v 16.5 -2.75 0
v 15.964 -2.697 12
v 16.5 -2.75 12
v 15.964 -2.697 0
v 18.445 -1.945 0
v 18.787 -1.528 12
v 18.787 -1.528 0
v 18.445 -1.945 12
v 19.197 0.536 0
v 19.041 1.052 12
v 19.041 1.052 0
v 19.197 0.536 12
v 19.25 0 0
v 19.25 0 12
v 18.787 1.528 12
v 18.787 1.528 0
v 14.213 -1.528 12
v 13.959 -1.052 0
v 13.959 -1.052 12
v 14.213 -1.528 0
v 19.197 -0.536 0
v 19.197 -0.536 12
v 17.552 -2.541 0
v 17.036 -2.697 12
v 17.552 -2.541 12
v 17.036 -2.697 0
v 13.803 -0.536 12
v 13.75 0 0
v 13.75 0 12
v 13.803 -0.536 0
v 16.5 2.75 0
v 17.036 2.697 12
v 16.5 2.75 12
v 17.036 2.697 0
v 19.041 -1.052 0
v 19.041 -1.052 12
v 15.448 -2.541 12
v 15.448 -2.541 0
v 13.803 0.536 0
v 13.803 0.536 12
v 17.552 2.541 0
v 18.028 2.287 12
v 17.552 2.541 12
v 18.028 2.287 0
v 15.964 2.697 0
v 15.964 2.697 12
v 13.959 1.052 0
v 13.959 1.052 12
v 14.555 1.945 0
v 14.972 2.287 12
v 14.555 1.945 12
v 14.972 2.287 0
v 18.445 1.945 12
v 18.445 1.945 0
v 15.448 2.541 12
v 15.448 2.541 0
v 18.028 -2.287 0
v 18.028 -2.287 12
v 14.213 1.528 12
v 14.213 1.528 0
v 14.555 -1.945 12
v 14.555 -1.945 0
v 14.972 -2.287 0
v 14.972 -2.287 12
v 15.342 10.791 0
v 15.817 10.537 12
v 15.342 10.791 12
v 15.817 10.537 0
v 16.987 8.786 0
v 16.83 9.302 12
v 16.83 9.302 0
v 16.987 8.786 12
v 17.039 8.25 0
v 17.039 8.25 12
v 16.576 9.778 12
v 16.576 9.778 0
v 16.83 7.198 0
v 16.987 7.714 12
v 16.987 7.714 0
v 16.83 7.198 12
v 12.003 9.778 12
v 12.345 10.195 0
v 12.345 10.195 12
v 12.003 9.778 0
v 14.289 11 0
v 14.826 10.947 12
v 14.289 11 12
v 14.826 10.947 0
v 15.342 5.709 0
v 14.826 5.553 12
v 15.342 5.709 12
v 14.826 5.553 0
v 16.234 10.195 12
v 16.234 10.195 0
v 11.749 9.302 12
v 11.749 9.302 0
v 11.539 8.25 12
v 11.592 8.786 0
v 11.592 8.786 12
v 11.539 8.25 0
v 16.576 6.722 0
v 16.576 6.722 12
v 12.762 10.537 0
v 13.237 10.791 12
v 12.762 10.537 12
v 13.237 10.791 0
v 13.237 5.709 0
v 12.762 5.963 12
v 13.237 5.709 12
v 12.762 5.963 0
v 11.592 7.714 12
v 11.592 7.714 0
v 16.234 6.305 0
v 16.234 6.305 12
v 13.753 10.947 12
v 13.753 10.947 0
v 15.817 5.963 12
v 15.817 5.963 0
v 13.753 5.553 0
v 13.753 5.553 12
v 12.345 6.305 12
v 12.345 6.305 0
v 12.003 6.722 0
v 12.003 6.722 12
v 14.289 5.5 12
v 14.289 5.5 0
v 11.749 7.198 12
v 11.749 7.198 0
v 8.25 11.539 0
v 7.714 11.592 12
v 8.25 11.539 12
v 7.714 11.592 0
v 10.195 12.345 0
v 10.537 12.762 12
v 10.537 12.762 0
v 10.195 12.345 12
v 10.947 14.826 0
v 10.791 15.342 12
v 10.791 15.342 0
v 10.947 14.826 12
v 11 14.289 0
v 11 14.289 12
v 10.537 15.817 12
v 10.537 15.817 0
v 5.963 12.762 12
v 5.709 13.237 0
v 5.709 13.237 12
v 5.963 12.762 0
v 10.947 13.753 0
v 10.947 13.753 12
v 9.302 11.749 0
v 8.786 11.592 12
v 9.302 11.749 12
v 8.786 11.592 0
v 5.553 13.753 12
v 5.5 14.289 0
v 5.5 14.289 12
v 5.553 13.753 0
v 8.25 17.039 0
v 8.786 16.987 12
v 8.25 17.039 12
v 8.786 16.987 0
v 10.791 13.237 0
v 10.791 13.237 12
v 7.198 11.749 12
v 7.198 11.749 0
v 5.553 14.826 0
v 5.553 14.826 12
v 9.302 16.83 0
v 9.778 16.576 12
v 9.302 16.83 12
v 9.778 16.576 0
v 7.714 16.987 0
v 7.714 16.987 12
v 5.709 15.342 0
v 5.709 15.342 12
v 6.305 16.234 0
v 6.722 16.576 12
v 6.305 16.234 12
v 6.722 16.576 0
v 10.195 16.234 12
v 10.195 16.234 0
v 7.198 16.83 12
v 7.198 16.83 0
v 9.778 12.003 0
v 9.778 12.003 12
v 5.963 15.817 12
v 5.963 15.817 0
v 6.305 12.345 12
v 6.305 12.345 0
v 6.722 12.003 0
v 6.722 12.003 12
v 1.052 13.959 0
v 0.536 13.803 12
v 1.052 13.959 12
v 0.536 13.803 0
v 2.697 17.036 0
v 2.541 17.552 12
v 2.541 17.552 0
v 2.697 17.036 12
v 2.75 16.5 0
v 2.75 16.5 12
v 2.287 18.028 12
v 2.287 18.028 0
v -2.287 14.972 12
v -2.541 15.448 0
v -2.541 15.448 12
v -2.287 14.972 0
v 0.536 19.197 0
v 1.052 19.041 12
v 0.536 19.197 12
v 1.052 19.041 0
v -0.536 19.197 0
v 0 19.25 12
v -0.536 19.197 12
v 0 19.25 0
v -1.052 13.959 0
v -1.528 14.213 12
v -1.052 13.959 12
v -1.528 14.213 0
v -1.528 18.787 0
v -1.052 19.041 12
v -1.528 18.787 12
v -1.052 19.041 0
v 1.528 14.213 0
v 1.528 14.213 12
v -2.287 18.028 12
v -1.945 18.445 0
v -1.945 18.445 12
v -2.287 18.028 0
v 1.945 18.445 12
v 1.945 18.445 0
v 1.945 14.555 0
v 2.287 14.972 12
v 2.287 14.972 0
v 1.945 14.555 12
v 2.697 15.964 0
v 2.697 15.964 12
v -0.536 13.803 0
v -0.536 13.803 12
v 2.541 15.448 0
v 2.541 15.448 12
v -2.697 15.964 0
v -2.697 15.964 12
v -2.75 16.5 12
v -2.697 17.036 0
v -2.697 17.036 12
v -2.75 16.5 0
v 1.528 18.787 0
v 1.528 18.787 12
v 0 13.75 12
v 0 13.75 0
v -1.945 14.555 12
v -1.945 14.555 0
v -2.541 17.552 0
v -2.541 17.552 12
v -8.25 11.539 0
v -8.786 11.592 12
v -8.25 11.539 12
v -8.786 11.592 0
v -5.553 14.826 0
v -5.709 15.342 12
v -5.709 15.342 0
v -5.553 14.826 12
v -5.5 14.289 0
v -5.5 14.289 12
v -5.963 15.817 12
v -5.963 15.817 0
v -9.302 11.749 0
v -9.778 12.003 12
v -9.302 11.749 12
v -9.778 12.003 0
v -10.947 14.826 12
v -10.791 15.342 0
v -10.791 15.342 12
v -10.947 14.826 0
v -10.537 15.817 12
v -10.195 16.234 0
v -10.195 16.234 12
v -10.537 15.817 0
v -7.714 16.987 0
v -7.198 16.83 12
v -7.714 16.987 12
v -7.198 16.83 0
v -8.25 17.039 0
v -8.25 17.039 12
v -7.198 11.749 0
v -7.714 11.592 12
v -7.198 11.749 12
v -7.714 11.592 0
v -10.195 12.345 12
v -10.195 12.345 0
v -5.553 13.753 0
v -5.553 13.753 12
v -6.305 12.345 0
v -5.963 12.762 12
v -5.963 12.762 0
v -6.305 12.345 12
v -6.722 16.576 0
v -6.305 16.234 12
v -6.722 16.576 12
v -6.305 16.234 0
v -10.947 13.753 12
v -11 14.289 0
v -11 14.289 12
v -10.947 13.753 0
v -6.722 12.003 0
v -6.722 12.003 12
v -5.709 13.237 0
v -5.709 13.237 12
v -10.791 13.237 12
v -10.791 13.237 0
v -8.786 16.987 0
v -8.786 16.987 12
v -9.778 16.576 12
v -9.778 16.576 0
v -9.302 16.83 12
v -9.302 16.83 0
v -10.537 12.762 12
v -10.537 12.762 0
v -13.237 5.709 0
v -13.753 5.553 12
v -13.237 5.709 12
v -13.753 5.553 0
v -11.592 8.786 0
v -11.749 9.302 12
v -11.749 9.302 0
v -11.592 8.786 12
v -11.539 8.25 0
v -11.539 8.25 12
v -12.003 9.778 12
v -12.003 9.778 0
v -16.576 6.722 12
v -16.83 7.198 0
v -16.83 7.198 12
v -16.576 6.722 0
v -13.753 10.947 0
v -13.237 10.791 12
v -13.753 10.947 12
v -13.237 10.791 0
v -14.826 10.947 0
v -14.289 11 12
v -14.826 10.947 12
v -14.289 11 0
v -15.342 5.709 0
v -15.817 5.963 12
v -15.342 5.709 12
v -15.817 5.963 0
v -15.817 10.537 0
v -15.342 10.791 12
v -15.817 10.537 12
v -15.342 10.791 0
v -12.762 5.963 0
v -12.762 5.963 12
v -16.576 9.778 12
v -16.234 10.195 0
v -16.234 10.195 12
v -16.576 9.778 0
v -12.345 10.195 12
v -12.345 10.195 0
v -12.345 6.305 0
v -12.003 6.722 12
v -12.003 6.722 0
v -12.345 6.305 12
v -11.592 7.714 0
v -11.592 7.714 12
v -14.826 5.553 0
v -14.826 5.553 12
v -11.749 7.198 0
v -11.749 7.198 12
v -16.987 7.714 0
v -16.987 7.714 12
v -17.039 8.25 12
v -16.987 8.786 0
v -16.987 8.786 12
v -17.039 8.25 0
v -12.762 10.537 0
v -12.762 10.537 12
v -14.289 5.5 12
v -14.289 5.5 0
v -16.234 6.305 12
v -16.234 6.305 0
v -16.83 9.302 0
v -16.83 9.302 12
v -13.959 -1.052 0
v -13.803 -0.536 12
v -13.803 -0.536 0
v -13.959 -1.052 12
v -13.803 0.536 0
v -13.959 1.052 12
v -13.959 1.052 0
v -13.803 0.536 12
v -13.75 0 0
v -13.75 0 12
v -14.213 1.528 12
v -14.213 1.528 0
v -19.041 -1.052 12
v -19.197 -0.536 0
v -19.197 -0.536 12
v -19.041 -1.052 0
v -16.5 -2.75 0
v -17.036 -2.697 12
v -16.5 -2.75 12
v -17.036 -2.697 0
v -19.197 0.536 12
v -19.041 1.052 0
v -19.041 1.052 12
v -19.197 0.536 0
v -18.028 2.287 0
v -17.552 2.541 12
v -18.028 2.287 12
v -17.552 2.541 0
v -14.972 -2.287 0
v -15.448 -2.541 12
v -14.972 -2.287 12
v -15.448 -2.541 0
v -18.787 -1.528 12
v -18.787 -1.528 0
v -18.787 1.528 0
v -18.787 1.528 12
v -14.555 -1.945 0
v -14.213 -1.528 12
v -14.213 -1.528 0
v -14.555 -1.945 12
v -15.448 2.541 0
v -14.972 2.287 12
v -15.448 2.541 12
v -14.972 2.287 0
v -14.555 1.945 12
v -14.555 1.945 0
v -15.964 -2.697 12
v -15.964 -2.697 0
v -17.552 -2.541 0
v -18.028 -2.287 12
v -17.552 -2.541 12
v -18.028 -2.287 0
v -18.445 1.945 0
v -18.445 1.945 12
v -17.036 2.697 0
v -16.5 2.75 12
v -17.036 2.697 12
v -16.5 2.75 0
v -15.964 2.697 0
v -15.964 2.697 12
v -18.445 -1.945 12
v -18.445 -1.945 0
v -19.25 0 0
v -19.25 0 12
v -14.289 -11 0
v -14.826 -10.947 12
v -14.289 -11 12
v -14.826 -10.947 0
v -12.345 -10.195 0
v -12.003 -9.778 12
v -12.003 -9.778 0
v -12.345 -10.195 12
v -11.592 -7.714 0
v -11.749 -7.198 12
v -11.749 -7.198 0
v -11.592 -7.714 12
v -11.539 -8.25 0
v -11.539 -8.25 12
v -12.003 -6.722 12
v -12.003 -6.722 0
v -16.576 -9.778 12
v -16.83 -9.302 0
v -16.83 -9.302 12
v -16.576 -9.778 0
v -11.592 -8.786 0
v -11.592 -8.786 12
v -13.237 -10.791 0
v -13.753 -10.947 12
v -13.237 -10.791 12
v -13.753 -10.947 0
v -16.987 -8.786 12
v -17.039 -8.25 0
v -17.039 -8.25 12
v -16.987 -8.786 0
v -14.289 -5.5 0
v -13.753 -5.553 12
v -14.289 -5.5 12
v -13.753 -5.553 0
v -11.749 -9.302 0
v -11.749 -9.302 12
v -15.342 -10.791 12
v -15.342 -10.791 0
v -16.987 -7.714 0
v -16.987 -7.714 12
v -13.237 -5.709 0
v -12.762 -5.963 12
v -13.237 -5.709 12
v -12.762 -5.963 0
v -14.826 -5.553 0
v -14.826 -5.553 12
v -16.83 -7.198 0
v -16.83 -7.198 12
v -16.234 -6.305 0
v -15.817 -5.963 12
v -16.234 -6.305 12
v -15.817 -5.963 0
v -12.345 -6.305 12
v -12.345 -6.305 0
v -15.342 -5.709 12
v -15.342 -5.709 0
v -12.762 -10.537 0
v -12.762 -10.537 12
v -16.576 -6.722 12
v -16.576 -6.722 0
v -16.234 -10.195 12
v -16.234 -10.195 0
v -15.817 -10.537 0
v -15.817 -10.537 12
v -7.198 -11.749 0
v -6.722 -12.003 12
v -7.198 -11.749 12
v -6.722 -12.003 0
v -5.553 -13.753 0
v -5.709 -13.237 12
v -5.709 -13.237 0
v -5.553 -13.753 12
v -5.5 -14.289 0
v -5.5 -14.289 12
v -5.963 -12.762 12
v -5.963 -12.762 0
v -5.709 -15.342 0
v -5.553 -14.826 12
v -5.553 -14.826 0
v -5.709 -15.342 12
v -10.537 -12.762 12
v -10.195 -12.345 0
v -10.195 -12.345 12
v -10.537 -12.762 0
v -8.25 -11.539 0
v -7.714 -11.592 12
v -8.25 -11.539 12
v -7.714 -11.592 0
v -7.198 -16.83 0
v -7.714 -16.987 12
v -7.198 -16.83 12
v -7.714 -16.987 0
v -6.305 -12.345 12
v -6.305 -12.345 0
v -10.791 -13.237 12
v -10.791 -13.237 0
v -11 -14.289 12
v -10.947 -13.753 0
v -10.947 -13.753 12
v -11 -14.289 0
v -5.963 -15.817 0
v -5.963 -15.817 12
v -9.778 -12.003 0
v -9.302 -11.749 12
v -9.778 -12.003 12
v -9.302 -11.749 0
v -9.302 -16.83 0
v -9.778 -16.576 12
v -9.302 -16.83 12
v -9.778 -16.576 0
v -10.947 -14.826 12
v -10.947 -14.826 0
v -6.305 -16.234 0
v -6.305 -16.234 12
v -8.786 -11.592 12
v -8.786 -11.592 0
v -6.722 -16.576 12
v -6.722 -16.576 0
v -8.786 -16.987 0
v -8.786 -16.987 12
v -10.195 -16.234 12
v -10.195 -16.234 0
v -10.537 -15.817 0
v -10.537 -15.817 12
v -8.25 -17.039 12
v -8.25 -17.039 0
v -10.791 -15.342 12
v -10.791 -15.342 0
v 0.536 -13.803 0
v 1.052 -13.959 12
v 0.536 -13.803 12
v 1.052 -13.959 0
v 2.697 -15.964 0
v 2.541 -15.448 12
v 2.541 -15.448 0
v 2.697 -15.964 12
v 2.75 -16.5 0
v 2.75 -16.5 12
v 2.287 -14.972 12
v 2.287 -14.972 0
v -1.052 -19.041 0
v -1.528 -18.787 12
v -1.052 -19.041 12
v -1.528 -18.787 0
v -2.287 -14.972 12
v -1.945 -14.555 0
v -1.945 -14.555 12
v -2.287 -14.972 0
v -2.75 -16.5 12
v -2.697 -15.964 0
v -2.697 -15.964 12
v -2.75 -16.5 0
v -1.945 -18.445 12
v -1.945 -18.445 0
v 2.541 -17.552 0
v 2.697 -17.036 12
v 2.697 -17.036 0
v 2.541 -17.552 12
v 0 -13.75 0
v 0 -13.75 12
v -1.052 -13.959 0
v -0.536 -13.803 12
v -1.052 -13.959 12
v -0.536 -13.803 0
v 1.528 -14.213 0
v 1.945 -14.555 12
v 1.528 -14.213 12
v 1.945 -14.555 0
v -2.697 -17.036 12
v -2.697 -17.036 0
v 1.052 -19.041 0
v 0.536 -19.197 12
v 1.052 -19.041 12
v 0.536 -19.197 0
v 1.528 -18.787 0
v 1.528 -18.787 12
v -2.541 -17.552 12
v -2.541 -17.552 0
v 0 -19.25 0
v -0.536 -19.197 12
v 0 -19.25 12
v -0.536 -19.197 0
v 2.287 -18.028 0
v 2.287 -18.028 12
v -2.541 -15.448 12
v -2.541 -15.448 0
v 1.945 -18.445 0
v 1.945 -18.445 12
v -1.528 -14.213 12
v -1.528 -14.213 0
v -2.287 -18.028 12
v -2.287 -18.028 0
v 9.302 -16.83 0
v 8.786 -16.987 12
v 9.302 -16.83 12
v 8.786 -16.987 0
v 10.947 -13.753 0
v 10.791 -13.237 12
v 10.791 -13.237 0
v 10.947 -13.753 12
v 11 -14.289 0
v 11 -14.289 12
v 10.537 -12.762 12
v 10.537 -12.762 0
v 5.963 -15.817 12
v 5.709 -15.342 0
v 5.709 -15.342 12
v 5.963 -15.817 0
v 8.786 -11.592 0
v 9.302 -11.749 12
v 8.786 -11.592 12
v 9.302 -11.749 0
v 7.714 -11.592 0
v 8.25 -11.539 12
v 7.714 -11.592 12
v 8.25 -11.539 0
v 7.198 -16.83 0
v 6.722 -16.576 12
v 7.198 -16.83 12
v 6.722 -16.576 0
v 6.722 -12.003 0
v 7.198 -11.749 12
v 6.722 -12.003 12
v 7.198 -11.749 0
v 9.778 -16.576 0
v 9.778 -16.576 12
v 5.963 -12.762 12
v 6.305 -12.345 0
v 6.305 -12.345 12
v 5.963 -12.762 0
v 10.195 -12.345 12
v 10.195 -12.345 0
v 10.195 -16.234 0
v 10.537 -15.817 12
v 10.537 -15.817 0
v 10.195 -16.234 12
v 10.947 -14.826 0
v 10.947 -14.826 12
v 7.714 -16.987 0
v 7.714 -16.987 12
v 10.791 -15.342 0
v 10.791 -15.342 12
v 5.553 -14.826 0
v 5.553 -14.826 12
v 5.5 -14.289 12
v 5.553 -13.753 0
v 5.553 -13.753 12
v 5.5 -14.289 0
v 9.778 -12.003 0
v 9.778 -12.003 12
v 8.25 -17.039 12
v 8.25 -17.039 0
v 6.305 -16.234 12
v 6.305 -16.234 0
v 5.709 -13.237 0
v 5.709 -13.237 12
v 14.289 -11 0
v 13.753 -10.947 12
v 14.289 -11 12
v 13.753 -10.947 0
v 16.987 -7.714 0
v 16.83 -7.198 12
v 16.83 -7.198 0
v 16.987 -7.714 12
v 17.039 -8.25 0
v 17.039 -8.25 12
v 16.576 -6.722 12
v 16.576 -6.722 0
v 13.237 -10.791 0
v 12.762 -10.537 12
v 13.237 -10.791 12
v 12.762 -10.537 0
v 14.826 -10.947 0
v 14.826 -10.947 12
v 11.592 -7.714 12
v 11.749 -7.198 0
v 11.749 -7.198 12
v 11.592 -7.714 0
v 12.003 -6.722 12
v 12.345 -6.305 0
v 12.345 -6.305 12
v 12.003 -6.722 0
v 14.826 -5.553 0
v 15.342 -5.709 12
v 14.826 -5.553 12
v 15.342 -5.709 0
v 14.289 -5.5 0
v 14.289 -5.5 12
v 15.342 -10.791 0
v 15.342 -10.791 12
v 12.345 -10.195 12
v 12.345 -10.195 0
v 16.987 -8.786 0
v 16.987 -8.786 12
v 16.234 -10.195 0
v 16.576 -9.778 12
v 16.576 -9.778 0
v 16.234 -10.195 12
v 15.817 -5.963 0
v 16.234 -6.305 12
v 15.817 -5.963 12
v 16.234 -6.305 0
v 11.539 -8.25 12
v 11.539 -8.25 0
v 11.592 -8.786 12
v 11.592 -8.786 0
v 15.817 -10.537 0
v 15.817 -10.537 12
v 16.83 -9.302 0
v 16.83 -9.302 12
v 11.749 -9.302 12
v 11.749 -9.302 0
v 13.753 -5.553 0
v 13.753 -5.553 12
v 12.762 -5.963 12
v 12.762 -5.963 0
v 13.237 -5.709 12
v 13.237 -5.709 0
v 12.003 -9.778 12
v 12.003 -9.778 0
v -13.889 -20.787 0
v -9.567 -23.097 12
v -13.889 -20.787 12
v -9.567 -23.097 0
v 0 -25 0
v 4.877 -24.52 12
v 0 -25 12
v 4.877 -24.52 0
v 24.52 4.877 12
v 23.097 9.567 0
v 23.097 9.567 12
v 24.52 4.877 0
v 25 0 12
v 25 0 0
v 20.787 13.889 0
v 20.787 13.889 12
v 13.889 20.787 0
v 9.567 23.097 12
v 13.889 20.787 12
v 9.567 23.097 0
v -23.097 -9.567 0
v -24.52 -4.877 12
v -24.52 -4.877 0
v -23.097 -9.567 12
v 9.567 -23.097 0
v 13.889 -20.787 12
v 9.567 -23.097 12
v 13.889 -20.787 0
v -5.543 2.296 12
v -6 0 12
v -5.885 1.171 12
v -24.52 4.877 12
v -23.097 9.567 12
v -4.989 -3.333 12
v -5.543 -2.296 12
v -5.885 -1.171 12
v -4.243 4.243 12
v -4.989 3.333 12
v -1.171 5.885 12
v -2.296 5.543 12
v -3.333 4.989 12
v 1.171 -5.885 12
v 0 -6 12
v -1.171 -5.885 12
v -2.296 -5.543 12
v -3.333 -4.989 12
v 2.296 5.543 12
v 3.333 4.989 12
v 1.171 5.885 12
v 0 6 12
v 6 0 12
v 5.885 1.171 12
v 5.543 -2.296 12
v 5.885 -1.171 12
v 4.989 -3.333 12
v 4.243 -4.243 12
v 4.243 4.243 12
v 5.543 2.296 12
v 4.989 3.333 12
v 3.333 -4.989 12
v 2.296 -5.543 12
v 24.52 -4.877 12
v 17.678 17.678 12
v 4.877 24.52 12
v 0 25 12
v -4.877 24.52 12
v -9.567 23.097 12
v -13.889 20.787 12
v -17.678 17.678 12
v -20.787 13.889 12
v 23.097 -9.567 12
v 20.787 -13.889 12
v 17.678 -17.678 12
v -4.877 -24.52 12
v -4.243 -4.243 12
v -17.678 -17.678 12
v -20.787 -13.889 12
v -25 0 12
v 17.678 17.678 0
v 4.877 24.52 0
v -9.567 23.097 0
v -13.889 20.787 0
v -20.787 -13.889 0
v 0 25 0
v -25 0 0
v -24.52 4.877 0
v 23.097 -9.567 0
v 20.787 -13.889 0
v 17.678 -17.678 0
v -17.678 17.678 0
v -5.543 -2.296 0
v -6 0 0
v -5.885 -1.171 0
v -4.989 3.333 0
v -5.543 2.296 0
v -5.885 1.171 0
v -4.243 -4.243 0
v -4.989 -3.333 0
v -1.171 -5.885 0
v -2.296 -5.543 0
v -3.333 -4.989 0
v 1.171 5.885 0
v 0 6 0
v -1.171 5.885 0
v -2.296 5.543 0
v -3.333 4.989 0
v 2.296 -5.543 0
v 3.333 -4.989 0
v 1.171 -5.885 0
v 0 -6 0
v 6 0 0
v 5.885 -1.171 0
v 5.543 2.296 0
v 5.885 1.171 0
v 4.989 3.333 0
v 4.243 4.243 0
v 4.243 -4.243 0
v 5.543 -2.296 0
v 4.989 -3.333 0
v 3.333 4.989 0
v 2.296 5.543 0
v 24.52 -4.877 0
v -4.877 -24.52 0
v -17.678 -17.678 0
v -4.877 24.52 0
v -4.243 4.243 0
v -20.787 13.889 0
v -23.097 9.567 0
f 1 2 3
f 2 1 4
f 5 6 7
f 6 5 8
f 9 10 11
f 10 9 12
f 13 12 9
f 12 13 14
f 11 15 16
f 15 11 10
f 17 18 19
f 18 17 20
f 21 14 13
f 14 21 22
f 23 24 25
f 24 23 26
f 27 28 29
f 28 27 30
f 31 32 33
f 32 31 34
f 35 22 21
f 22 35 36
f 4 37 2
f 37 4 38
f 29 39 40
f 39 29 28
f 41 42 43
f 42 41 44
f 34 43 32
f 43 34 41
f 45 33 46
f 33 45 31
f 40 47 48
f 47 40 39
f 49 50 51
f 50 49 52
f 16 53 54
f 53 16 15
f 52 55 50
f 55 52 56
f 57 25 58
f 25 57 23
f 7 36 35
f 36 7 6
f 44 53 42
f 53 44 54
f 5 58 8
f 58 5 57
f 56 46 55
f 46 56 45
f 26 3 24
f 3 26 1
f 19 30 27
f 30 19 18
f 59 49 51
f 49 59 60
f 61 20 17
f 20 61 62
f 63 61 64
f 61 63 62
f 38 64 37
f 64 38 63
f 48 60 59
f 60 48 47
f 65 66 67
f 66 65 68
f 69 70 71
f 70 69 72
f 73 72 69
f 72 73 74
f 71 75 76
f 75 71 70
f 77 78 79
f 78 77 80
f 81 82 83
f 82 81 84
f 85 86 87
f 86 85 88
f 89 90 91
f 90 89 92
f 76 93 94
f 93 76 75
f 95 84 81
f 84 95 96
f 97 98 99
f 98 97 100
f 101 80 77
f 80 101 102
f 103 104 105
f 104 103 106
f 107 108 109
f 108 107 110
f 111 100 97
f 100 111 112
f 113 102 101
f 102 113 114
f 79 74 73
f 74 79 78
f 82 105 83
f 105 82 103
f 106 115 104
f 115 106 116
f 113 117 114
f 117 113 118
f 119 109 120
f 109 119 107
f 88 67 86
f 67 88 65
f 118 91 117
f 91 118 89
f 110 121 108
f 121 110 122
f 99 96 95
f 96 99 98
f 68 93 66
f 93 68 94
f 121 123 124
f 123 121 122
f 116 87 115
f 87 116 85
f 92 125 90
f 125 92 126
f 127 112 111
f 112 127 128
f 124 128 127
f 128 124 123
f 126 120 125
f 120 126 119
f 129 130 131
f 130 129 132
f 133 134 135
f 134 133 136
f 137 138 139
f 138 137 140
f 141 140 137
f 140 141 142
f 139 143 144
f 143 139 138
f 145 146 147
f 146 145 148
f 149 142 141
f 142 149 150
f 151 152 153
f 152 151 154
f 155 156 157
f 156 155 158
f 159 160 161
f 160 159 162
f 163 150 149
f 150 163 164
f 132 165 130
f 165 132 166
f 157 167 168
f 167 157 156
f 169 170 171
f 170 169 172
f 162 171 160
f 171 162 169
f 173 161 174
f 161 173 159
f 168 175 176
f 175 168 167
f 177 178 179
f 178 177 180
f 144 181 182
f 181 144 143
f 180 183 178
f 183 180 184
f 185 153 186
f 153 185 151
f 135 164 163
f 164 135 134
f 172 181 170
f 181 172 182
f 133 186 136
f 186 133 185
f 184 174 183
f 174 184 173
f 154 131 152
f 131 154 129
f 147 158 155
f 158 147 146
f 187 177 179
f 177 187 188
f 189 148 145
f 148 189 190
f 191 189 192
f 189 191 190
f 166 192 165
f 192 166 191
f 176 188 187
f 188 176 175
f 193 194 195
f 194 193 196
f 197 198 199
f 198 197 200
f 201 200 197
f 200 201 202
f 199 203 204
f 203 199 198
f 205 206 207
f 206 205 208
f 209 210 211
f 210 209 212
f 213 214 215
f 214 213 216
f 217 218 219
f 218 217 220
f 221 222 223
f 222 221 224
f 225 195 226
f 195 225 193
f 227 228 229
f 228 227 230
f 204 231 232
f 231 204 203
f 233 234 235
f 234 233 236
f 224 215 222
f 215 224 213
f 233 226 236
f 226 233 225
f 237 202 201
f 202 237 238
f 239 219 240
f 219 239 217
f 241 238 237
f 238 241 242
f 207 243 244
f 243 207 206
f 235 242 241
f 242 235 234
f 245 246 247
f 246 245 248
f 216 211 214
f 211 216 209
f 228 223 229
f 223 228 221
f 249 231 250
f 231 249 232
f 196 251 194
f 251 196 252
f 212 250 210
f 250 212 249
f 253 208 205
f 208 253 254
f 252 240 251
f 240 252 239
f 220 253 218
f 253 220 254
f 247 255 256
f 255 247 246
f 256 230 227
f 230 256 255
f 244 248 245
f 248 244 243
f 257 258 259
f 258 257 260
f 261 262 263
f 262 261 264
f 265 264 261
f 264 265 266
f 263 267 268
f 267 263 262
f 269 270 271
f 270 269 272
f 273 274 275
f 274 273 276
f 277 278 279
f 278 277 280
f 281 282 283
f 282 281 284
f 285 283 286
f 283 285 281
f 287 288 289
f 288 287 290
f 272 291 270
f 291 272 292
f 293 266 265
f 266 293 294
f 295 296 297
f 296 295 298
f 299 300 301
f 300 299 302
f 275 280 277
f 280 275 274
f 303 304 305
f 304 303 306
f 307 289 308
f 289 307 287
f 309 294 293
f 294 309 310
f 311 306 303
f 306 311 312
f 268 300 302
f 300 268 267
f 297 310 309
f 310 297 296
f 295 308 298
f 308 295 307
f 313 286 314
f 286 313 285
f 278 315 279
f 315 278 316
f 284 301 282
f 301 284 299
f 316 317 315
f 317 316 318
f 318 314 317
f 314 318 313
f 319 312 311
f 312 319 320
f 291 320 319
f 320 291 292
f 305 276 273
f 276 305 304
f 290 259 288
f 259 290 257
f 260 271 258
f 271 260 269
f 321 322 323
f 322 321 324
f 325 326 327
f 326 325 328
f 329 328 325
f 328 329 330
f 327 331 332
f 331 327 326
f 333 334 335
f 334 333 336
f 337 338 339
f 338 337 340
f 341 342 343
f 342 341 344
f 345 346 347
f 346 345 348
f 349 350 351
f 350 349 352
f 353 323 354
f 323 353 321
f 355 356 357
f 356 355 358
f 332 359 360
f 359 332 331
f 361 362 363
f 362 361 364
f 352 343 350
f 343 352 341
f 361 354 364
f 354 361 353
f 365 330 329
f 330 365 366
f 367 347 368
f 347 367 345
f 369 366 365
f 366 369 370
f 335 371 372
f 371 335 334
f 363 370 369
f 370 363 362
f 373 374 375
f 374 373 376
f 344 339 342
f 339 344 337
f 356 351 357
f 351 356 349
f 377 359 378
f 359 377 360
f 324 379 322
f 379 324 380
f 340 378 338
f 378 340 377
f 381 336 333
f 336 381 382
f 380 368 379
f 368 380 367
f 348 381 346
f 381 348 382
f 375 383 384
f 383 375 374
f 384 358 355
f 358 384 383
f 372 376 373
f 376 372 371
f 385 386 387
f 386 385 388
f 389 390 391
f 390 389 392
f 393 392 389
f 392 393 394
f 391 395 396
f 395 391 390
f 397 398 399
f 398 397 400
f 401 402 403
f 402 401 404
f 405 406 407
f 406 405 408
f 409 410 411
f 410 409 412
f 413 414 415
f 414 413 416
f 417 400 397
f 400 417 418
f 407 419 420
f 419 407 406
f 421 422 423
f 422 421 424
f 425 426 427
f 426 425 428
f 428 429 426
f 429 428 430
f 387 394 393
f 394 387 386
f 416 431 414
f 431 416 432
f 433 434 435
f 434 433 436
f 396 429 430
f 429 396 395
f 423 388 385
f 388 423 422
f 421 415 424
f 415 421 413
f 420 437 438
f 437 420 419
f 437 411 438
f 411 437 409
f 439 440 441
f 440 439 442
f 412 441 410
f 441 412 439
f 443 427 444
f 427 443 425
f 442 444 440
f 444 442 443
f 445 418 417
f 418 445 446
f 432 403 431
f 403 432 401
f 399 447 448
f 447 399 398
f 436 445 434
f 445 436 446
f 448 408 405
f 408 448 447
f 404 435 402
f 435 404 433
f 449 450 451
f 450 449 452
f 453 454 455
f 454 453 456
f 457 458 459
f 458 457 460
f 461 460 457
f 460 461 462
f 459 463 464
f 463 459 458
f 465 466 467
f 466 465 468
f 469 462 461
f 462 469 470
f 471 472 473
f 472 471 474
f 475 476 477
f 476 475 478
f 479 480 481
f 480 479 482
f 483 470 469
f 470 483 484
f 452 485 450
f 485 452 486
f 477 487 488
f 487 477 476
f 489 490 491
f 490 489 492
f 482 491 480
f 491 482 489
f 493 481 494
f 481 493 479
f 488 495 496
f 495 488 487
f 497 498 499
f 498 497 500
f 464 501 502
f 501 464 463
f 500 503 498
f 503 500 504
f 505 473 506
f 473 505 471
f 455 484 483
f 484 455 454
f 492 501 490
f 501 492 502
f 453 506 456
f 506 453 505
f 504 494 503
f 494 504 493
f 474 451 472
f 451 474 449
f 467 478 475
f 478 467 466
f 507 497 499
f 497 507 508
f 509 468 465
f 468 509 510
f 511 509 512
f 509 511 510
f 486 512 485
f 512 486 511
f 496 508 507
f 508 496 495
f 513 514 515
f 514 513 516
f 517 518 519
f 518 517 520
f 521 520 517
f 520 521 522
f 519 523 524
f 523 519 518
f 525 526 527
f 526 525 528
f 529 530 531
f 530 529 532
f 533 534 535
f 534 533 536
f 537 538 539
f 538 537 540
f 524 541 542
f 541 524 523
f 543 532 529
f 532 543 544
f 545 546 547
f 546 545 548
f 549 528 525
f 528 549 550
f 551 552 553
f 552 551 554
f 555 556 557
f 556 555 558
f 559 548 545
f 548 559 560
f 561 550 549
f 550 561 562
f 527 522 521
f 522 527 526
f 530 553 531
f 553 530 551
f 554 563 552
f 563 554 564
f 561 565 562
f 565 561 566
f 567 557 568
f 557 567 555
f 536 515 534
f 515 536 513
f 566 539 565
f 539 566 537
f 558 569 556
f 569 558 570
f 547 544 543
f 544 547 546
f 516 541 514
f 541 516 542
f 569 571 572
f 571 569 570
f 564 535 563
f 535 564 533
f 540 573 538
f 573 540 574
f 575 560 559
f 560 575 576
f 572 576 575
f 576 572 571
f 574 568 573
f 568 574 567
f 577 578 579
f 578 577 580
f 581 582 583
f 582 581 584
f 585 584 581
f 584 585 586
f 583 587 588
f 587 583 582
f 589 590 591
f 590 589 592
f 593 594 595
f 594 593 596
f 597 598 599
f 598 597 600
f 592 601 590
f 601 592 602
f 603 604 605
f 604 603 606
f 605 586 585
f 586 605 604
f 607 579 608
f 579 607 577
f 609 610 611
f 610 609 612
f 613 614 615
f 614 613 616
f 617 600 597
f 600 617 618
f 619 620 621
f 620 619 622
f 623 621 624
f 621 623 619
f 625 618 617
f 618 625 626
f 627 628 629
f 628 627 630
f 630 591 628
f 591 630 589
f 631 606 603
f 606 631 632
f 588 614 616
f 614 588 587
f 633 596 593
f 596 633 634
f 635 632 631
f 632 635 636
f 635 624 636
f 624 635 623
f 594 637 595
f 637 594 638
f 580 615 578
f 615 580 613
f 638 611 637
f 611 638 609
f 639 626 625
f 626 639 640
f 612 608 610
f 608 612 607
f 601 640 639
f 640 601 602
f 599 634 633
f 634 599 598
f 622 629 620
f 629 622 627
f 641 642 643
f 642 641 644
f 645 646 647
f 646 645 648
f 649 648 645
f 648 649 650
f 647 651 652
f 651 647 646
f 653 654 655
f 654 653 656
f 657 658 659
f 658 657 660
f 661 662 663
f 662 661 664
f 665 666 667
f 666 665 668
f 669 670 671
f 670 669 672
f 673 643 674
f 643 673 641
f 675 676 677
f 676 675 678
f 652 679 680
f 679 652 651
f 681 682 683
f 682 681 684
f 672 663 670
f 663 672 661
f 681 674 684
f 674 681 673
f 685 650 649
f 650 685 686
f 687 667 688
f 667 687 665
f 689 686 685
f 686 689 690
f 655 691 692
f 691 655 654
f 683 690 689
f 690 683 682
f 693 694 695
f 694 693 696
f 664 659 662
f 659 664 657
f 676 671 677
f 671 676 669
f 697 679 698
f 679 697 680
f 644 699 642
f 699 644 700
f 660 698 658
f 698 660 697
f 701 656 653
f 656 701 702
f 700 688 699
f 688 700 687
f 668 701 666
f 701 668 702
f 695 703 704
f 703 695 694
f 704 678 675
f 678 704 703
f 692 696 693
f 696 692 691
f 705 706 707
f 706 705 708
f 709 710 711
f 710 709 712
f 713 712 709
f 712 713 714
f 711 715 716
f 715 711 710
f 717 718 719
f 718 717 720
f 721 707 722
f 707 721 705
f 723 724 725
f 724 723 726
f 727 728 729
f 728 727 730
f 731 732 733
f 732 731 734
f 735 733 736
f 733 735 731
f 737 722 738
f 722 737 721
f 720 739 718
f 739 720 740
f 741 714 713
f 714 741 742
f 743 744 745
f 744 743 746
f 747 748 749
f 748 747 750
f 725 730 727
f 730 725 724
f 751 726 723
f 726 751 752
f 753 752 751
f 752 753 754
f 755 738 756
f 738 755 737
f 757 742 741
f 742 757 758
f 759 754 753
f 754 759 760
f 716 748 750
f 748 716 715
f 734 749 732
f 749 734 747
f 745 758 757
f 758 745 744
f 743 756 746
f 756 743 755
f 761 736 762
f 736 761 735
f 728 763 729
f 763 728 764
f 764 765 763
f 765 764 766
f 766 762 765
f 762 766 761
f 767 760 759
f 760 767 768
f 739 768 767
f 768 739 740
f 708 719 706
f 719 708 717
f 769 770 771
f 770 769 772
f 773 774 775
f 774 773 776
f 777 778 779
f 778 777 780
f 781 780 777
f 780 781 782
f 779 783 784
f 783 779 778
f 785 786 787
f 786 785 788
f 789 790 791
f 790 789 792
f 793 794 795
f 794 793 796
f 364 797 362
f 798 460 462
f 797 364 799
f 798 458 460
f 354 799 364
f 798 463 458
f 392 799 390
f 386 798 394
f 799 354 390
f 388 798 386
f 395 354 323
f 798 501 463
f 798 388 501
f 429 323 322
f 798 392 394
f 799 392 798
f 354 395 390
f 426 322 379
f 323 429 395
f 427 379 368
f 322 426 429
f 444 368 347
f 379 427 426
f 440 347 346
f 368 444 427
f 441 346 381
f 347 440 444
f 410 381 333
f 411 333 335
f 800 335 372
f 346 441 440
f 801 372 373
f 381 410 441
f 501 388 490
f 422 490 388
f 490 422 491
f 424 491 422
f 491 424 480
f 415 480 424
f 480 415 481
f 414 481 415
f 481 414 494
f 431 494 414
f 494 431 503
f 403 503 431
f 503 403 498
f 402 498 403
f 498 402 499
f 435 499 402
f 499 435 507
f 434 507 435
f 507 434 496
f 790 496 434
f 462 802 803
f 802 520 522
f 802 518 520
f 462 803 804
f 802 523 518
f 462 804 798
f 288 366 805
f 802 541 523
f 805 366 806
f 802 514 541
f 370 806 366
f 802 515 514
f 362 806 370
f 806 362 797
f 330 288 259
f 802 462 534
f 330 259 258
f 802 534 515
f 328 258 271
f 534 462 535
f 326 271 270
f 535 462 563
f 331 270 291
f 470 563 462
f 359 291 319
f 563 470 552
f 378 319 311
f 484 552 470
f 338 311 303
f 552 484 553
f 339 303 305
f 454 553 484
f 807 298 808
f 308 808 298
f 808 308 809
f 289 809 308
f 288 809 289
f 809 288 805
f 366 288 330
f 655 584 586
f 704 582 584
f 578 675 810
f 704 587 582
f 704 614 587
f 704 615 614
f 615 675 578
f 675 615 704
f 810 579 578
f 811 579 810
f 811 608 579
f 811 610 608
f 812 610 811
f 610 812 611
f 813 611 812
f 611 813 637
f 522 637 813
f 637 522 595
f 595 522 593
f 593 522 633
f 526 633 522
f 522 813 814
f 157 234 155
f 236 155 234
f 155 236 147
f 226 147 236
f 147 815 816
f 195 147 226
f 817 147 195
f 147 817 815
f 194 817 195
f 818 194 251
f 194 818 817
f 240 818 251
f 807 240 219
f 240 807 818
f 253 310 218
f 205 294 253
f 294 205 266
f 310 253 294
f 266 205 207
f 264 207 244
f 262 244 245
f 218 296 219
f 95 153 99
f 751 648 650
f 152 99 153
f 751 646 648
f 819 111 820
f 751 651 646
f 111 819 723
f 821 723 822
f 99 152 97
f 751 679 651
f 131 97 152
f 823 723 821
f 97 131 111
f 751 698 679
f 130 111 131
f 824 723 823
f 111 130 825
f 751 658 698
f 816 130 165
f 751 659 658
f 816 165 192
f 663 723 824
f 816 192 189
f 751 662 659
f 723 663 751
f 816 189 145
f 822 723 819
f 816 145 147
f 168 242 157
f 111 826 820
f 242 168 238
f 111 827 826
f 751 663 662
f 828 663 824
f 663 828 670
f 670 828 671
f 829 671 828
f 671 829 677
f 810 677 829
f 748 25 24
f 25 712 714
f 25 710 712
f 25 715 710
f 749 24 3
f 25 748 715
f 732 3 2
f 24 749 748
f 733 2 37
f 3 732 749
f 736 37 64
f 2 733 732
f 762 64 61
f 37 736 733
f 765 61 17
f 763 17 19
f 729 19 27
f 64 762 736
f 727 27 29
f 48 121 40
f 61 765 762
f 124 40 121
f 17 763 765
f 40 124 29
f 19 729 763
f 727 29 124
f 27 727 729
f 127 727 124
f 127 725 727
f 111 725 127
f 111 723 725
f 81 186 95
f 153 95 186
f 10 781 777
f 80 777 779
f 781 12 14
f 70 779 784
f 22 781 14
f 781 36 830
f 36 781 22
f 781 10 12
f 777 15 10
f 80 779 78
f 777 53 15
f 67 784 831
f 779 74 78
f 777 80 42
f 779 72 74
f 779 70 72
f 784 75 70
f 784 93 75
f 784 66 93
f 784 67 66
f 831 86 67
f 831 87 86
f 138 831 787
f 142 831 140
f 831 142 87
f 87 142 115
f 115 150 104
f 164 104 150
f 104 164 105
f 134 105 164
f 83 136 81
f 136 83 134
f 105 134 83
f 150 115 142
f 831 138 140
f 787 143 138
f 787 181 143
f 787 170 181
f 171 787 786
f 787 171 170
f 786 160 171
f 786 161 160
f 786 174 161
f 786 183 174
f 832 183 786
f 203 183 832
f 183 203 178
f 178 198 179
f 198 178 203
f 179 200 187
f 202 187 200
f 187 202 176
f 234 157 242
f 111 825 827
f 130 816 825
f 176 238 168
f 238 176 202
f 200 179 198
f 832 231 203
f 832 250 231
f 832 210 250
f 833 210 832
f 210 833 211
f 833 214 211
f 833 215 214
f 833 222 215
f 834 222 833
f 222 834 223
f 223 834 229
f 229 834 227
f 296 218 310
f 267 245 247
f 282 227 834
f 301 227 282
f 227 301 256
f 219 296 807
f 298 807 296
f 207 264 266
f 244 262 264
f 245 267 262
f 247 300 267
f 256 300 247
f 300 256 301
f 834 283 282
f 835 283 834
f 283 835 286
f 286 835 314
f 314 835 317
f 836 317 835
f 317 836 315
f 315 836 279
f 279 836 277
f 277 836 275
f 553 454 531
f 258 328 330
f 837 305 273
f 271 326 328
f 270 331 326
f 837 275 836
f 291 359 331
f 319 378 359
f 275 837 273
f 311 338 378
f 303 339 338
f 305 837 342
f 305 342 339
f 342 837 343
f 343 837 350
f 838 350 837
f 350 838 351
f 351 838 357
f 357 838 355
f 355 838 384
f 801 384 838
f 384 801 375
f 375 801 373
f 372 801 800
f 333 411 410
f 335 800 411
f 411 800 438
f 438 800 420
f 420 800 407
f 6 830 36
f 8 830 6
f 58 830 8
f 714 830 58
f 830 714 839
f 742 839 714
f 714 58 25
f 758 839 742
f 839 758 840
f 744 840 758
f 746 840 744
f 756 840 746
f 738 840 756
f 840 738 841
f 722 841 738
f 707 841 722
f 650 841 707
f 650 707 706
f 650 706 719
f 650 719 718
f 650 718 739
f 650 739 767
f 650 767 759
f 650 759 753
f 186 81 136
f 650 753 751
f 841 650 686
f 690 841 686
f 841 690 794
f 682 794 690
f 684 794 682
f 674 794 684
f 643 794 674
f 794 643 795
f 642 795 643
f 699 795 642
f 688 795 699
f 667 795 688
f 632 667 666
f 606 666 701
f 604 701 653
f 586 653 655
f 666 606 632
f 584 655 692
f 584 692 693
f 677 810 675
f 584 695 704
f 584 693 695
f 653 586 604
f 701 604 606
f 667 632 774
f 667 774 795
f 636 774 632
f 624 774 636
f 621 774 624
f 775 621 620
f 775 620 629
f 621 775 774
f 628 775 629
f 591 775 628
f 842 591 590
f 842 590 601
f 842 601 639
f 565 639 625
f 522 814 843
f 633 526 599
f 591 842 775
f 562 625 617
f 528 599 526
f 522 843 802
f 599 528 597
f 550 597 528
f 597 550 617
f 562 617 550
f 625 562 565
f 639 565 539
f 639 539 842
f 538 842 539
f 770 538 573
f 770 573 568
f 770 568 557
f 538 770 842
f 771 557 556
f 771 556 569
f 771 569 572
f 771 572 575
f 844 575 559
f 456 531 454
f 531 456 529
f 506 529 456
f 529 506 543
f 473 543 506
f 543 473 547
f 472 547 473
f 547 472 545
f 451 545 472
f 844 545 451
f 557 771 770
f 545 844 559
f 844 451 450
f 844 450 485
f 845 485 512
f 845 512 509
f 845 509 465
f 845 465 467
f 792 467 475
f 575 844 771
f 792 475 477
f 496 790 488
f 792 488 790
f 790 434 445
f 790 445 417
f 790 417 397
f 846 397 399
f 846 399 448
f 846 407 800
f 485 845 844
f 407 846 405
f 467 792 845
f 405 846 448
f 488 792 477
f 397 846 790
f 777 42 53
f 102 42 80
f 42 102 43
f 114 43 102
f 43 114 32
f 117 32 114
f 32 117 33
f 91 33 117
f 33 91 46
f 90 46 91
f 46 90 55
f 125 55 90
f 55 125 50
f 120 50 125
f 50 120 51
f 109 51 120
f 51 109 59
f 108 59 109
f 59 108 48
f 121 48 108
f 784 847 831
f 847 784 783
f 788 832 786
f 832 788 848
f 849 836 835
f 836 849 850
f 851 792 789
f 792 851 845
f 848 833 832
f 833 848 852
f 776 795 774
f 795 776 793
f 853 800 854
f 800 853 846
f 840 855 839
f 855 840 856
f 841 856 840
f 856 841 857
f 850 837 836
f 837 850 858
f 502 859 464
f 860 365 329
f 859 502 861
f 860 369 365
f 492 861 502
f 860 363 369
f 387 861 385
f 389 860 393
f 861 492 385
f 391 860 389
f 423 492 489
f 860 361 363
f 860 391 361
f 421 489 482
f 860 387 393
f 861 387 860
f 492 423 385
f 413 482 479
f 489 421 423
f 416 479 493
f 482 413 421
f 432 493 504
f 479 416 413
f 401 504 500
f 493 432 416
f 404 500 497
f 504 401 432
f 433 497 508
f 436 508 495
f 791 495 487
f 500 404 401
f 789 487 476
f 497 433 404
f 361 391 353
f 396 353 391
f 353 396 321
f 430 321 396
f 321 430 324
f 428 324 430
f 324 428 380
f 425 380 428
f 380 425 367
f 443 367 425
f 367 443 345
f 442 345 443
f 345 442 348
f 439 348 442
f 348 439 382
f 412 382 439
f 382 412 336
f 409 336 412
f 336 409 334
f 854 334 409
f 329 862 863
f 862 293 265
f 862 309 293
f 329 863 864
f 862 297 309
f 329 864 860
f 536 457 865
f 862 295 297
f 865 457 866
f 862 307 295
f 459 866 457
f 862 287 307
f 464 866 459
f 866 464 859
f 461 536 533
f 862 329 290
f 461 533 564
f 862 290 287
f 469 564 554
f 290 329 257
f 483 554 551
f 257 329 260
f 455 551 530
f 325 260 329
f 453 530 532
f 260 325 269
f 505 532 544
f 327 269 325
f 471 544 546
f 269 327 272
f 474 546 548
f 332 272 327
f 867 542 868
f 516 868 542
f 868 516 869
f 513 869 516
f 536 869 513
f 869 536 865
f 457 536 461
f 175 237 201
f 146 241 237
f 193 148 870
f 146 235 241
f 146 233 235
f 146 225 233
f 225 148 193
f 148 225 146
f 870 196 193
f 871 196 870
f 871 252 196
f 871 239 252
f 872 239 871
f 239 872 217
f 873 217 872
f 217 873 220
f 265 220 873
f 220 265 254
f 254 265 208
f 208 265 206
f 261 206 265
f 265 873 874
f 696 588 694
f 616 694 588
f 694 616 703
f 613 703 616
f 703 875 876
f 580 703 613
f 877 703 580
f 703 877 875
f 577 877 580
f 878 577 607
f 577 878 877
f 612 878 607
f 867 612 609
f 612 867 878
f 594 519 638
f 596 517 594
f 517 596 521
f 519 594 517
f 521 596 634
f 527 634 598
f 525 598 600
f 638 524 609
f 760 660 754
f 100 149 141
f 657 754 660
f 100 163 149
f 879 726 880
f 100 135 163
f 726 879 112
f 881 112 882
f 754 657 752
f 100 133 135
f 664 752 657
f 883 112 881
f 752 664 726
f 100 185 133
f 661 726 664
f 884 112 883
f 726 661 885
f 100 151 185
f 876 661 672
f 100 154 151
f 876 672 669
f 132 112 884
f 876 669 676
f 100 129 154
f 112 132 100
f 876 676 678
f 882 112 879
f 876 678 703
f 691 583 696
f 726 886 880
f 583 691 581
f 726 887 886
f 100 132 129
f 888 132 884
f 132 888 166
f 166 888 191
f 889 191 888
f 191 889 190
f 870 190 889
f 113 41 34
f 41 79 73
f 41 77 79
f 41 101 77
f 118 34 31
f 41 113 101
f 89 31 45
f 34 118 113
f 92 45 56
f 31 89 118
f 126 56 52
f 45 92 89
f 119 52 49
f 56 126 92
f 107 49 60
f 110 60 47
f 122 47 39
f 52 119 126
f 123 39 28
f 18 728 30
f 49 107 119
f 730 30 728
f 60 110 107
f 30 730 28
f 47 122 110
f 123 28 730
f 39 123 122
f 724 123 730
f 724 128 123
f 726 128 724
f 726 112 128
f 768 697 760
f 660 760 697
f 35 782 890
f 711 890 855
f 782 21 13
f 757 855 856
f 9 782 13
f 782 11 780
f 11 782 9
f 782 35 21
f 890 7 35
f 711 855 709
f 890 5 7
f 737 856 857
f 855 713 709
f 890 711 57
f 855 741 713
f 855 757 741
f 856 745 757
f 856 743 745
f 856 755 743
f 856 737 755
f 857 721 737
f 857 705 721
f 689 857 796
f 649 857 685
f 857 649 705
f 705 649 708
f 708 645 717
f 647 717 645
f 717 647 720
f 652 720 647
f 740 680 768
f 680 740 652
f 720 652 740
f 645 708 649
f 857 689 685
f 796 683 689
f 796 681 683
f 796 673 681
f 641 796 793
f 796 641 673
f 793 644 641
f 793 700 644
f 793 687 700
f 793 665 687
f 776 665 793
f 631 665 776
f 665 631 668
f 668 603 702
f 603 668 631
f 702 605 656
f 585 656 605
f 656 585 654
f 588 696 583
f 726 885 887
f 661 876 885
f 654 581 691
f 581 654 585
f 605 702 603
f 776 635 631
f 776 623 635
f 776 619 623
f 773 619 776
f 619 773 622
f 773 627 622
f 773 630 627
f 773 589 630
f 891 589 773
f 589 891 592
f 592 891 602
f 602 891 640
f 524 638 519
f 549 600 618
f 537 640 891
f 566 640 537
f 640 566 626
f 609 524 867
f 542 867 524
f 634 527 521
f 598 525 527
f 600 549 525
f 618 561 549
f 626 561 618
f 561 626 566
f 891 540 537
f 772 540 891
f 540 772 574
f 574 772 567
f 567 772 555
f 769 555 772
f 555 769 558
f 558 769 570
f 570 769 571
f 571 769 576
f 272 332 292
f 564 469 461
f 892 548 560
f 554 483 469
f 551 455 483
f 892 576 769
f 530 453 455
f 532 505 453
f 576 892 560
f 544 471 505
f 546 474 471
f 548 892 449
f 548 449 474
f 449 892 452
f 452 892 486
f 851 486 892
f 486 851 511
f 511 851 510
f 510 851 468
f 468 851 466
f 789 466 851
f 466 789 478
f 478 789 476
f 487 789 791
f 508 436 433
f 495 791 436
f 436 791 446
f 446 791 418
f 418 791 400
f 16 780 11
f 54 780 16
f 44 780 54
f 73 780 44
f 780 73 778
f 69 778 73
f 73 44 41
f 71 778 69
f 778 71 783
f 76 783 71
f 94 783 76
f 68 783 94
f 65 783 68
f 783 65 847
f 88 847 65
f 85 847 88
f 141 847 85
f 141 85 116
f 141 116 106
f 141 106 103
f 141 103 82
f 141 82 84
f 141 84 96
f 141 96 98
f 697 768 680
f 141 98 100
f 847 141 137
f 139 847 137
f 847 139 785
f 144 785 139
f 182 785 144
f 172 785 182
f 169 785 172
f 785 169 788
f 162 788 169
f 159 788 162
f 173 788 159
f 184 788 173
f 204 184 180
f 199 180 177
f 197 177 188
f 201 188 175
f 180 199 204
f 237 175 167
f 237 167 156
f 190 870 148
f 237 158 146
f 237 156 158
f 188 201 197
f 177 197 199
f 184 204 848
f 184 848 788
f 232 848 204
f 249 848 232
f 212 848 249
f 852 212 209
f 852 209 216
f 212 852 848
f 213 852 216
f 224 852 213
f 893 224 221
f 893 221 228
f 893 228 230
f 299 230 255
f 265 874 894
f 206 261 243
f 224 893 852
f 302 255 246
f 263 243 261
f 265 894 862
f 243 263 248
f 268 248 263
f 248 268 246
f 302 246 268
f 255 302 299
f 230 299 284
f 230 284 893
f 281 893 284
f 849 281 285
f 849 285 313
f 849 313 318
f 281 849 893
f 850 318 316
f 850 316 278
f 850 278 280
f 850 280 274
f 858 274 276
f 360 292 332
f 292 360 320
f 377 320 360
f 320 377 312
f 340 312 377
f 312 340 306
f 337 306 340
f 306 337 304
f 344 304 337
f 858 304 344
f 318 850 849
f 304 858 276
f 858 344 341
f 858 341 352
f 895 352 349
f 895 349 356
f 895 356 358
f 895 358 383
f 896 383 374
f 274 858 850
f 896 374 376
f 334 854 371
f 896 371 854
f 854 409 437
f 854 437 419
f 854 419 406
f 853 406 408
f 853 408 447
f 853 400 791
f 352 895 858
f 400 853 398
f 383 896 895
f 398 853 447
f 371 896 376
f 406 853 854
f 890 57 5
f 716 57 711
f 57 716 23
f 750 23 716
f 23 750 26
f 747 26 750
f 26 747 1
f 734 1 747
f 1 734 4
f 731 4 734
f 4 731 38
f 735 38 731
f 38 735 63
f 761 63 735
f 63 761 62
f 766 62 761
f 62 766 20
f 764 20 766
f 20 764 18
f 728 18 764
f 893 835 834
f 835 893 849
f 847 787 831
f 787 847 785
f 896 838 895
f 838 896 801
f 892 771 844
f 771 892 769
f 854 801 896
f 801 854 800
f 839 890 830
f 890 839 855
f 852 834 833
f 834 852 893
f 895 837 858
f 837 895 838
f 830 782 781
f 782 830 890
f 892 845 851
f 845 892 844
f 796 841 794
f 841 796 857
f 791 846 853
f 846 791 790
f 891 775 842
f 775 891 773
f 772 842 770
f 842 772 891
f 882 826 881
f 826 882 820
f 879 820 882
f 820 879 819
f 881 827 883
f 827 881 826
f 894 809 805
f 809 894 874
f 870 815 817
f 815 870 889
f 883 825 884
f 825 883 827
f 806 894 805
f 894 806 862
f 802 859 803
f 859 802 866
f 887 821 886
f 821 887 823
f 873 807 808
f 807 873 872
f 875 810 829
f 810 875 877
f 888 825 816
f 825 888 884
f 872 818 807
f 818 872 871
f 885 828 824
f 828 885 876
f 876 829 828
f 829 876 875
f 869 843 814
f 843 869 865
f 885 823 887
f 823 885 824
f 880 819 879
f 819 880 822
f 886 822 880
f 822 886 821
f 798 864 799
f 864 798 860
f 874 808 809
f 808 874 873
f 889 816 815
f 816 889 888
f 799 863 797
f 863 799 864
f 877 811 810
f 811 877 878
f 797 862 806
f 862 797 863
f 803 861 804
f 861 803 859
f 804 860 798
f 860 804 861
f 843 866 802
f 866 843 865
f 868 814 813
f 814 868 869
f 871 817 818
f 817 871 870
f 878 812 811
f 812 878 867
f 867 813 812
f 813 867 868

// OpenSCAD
$fn = 32;

// ----------------------------------------------------------------------
// Flange Ø50 x 12
// 12 holes on a Ø33 bolt circle, bolted joints
// ----------------------------------------------------------------------

// --- parameters (mm) ---
flange_d = 50;   // outside diameter of the flange
thickness = 12;  // flange thickness
holes = 12;      // number of bolt holes
pcd = 33;        // bolt circle diameter
start_deg = 0;   // angle of the first hole, from +X
hole_d = 5.5;    // bolt hole diameter
bore_d = 12;     // central through bore
hub_d = 20;      // hub outside diameter
hub_h = 0;       // hub height above the flange face (0 = no hub)

// --- derived feature positions (mm) ---
height = thickness + hub_h;  // = 12   overall height of the part
pcd_r = pcd / 2;             // = 16.5   bolt circle radius
hole_step = 360 / holes;     // = 30   angular pitch
feature_centers = [
  [pcd_r * cos(start_deg + 0 * hole_step), pcd_r * sin(start_deg + 0 * hole_step)],
  [pcd_r * cos(start_deg + 1 * hole_step), pcd_r * sin(start_deg + 1 * hole_step)],
  [pcd_r * cos(start_deg + 2 * hole_step), pcd_r * sin(start_deg + 2 * hole_step)],
  [pcd_r * cos(start_deg + 3 * hole_step), pcd_r * sin(start_deg + 3 * hole_step)],
  [pcd_r * cos(start_deg + 4 * hole_step), pcd_r * sin(start_deg + 4 * hole_step)],
  [pcd_r * cos(start_deg + 5 * hole_step), pcd_r * sin(start_deg + 5 * hole_step)],
  [pcd_r * cos(start_deg + 6 * hole_step), pcd_r * sin(start_deg + 6 * hole_step)],
  [pcd_r * cos(start_deg + 7 * hole_step), pcd_r * sin(start_deg + 7 * hole_step)],
  [pcd_r * cos(start_deg + 8 * hole_step), pcd_r * sin(start_deg + 8 * hole_step)],
  [pcd_r * cos(start_deg + 9 * hole_step), pcd_r * sin(start_deg + 9 * hole_step)],
  [pcd_r * cos(start_deg + 10 * hole_step), pcd_r * sin(start_deg + 10 * hole_step)],
  [pcd_r * cos(start_deg + 11 * hole_step), pcd_r * sin(start_deg + 11 * hole_step)]
];   // bolt hole centres on the pitch circle

// flange disc, every hole and the bore cut straight through
difference() {
  union() {
    cylinder(d = flange_d, h = thickness);
  }
  translate([0, 0, -1]) cylinder(d = bore_d, h = height + 2);  // bore, through
  for (centre = feature_centers)
    translate([centre[0], centre[1], -1]) cylinder(d = hole_d, h = thickness + 2);
}
